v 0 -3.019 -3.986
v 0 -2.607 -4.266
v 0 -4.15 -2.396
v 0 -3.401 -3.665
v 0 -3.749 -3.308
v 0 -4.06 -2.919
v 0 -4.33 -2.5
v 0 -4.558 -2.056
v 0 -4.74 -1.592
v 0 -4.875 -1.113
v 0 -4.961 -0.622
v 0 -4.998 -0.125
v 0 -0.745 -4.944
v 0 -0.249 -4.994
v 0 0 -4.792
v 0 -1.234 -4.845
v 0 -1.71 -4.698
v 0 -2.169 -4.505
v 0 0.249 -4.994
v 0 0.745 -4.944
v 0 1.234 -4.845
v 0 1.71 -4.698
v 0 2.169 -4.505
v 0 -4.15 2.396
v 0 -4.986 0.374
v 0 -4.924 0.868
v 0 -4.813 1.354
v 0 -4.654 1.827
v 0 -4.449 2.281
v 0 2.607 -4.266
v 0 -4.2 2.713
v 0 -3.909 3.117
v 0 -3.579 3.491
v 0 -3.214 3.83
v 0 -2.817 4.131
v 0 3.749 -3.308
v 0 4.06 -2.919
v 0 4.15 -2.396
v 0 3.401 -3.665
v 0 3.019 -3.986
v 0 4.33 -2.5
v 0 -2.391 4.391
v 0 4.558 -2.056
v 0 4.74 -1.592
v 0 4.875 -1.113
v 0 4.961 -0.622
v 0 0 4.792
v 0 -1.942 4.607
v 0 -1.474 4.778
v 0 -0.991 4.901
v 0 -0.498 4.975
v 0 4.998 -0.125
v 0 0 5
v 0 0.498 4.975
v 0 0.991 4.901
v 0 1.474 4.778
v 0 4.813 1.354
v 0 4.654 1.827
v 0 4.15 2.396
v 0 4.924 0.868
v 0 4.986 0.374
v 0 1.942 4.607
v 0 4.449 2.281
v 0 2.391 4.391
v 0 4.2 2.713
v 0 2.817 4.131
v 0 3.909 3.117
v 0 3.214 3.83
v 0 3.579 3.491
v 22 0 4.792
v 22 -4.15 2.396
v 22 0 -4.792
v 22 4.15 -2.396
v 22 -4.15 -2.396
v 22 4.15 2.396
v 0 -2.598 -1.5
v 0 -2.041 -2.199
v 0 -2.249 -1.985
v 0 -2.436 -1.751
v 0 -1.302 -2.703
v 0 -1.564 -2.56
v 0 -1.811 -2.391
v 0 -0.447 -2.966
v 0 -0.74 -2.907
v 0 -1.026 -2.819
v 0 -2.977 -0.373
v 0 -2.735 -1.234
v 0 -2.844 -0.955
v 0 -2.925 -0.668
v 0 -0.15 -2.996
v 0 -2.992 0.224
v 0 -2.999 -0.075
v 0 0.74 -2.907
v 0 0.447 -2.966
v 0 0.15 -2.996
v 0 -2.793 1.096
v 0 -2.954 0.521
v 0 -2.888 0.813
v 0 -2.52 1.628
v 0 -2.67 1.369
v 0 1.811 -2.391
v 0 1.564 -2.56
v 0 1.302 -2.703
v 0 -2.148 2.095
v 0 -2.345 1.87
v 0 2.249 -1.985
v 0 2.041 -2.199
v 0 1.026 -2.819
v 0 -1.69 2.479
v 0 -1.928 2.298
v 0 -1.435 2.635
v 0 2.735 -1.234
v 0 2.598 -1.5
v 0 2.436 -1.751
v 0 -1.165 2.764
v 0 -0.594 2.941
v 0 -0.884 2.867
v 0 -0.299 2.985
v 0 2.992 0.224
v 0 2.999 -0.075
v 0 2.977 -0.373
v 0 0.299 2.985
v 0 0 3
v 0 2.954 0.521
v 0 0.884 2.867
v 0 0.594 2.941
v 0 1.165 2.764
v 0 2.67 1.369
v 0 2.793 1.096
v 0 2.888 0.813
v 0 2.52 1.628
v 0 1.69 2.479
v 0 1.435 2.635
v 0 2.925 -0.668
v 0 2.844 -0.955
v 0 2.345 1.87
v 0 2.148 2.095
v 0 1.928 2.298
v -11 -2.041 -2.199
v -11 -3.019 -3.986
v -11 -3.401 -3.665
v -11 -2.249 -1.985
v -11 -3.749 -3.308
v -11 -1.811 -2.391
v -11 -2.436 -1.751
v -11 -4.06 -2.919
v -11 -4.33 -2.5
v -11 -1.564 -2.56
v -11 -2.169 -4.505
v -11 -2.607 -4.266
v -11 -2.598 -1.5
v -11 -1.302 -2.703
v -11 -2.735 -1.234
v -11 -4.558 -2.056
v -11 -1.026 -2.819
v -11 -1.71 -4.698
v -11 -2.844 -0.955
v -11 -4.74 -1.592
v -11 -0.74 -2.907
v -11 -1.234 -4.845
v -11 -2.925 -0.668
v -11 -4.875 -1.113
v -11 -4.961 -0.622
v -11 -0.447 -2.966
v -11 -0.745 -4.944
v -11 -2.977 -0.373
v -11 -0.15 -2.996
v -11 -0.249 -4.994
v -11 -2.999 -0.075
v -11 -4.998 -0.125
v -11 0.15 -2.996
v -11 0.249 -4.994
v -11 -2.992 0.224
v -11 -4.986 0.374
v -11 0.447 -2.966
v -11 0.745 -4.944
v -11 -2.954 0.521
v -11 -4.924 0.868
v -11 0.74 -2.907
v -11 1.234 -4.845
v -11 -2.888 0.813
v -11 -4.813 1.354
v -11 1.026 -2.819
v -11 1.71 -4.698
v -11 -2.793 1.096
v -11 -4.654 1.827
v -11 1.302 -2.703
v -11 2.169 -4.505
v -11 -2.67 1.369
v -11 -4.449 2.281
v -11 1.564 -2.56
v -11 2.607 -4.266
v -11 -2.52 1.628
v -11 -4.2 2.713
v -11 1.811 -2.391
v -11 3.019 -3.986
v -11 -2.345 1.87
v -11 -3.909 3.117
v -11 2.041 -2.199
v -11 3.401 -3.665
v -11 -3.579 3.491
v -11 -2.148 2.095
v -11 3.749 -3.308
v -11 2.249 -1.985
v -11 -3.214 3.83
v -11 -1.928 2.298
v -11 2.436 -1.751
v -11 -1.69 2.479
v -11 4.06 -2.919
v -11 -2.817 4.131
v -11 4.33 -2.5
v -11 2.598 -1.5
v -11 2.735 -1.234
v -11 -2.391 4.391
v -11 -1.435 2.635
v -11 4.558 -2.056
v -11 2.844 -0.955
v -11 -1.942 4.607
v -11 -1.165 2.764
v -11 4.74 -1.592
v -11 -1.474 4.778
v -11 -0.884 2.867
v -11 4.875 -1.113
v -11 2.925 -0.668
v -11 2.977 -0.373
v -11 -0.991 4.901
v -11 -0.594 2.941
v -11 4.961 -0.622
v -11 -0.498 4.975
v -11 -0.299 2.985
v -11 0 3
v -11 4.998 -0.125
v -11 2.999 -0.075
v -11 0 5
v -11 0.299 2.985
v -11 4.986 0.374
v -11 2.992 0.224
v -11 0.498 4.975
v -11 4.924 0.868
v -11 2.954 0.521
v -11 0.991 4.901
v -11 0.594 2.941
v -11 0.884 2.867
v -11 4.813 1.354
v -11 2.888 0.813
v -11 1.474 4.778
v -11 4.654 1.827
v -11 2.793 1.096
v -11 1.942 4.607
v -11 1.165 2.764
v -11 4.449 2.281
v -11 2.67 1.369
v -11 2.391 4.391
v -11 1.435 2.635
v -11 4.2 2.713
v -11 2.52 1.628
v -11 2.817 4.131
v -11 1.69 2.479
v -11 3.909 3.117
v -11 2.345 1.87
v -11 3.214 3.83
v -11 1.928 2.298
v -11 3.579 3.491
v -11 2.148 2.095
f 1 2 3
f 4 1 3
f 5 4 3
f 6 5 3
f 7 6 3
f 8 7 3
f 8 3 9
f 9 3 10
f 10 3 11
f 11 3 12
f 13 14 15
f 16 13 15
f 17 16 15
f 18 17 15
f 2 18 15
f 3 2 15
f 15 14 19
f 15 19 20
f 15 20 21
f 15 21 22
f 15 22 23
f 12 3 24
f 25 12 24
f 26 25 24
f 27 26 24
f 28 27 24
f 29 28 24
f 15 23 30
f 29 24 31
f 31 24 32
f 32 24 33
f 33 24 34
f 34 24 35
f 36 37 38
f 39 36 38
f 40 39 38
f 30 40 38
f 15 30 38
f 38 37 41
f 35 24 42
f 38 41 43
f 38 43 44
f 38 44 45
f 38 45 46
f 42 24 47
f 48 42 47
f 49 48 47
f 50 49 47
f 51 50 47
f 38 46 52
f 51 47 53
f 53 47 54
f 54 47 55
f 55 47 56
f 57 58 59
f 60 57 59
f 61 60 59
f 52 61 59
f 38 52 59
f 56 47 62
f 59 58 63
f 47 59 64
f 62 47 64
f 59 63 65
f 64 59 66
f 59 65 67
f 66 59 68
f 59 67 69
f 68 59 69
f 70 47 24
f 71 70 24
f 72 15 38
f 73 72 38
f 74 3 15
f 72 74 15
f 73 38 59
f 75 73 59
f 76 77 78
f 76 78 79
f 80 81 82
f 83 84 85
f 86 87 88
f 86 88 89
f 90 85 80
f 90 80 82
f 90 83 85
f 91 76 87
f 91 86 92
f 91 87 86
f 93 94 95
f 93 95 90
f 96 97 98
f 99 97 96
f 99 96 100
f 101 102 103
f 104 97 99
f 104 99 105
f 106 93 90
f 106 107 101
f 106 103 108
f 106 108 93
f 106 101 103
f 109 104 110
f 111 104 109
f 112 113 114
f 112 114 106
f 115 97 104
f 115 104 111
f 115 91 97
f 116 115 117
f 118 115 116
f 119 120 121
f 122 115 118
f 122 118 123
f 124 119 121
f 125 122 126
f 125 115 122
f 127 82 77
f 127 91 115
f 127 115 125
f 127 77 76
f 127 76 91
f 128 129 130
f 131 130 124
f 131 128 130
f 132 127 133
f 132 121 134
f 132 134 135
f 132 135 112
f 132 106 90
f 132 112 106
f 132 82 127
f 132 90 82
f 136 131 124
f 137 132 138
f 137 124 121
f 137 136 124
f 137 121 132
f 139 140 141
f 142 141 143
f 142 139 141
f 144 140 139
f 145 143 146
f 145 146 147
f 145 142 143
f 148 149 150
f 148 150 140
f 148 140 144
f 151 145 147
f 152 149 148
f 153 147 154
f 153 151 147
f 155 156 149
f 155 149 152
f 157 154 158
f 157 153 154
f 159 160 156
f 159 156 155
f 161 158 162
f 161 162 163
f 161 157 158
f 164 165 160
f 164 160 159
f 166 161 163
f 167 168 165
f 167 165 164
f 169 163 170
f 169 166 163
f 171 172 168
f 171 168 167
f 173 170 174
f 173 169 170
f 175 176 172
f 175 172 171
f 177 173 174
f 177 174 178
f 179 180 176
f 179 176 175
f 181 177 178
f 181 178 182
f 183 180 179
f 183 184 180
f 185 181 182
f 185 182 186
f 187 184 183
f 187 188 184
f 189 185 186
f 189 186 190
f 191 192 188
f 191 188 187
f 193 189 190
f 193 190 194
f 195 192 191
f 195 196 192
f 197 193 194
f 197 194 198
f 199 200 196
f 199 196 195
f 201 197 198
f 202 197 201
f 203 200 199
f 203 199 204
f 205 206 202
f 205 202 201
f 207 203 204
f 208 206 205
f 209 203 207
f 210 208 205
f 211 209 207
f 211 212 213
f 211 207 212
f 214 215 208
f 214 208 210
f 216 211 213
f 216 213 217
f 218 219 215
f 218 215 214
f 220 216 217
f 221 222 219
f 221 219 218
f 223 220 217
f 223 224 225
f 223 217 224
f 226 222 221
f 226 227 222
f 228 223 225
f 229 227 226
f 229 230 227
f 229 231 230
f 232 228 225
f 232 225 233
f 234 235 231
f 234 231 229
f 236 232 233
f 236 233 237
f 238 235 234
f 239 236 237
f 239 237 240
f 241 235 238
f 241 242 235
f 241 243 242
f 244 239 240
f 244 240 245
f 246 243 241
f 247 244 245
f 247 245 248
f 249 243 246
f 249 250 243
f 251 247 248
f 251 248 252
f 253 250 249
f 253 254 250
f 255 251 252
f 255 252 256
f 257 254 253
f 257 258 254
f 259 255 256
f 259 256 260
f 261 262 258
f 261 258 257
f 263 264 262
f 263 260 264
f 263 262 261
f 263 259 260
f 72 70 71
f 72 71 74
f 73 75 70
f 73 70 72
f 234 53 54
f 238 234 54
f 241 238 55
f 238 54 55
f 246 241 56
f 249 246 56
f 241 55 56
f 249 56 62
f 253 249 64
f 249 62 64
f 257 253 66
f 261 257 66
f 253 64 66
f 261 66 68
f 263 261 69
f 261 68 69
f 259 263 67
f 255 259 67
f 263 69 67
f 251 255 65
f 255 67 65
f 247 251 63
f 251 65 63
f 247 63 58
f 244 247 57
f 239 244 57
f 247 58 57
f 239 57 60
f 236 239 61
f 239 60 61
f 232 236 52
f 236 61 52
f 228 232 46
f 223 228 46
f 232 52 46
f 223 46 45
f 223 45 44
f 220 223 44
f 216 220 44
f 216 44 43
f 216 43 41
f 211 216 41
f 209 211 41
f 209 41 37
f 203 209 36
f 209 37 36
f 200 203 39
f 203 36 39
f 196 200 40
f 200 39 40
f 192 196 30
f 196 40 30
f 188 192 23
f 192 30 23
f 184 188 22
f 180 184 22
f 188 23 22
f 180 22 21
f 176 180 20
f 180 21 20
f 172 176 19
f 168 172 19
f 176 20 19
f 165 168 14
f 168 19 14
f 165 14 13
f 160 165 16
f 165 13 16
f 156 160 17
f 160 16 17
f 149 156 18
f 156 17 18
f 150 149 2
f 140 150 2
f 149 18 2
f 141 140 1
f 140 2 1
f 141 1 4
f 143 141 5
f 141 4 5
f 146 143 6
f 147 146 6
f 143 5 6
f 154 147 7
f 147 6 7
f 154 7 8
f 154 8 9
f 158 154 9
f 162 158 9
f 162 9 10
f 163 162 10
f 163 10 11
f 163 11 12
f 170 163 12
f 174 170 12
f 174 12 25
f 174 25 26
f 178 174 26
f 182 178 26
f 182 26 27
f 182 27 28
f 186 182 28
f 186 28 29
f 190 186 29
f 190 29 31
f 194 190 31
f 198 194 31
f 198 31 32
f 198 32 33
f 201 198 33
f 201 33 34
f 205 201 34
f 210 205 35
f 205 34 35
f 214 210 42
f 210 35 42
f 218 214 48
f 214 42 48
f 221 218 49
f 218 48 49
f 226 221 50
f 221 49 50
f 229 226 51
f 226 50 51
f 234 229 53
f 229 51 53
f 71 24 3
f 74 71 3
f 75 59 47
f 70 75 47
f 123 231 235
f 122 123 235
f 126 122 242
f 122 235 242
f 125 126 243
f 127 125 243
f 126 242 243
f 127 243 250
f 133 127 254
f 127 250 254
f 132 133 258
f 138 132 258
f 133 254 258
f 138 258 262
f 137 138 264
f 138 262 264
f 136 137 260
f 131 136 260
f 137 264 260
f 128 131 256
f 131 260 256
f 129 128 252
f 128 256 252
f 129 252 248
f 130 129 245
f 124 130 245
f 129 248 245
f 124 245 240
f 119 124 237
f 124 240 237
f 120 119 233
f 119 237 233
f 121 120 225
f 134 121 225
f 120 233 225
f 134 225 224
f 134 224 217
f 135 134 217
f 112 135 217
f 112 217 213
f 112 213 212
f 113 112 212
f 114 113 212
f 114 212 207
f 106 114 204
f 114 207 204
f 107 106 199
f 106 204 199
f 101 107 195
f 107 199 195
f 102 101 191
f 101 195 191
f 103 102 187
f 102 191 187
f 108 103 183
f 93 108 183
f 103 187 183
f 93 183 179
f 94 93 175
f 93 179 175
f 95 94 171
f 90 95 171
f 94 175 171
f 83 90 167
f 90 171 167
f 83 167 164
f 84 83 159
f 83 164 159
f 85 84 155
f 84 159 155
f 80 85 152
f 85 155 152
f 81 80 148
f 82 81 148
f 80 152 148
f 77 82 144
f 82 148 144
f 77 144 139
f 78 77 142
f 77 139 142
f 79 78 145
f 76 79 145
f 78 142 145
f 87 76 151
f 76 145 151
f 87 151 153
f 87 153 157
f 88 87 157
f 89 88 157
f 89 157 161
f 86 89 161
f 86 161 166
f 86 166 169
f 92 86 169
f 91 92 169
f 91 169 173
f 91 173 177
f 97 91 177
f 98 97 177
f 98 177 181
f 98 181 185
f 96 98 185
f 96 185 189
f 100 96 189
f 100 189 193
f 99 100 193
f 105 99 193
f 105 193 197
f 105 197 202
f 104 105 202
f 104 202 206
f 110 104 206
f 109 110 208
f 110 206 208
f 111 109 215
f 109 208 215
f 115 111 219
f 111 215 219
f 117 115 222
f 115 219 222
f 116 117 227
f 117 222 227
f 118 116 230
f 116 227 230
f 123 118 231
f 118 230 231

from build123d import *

# Parameters (mm, degrees)
BOSS_EXTRUDE1_DEPTH = 22
SKETCH2_R           = 5
BOSS_EXTRUDE2_DEPTH = 11
SKETCH3_R           = 3
CUT_EXTRUDE1_DEPTH  = 11


with BuildPart() as part:
    # Sketch1 → Boss-Extrude1 (new body)
    with BuildSketch(Plane(origin=(0, 0, 0), x_dir=(0, 0, -1), z_dir=(1, 0, 0))):
        Polygon((2.396003617, -4.15), (4.792007234, 0), (2.396003617, 4.15), (-2.396003617, 4.15), (-4.792007234, 0), (-2.396003617, -4.15), align=None)
    extrude(amount=BOSS_EXTRUDE1_DEPTH)

    # Sketch2 → Boss-Extrude2 (add)
    with BuildSketch(Plane.ZY):
        Circle(SKETCH2_R)
    extrude(amount=BOSS_EXTRUDE2_DEPTH)

    # Sketch3 → Cut-Extrude1 (cut)
    with BuildSketch(Plane.ZY.offset(11)):
        Circle(SKETCH3_R)
    extrude(amount=-CUT_EXTRUDE1_DEPTH, mode=Mode.SUBTRACT)


solid = part.part
